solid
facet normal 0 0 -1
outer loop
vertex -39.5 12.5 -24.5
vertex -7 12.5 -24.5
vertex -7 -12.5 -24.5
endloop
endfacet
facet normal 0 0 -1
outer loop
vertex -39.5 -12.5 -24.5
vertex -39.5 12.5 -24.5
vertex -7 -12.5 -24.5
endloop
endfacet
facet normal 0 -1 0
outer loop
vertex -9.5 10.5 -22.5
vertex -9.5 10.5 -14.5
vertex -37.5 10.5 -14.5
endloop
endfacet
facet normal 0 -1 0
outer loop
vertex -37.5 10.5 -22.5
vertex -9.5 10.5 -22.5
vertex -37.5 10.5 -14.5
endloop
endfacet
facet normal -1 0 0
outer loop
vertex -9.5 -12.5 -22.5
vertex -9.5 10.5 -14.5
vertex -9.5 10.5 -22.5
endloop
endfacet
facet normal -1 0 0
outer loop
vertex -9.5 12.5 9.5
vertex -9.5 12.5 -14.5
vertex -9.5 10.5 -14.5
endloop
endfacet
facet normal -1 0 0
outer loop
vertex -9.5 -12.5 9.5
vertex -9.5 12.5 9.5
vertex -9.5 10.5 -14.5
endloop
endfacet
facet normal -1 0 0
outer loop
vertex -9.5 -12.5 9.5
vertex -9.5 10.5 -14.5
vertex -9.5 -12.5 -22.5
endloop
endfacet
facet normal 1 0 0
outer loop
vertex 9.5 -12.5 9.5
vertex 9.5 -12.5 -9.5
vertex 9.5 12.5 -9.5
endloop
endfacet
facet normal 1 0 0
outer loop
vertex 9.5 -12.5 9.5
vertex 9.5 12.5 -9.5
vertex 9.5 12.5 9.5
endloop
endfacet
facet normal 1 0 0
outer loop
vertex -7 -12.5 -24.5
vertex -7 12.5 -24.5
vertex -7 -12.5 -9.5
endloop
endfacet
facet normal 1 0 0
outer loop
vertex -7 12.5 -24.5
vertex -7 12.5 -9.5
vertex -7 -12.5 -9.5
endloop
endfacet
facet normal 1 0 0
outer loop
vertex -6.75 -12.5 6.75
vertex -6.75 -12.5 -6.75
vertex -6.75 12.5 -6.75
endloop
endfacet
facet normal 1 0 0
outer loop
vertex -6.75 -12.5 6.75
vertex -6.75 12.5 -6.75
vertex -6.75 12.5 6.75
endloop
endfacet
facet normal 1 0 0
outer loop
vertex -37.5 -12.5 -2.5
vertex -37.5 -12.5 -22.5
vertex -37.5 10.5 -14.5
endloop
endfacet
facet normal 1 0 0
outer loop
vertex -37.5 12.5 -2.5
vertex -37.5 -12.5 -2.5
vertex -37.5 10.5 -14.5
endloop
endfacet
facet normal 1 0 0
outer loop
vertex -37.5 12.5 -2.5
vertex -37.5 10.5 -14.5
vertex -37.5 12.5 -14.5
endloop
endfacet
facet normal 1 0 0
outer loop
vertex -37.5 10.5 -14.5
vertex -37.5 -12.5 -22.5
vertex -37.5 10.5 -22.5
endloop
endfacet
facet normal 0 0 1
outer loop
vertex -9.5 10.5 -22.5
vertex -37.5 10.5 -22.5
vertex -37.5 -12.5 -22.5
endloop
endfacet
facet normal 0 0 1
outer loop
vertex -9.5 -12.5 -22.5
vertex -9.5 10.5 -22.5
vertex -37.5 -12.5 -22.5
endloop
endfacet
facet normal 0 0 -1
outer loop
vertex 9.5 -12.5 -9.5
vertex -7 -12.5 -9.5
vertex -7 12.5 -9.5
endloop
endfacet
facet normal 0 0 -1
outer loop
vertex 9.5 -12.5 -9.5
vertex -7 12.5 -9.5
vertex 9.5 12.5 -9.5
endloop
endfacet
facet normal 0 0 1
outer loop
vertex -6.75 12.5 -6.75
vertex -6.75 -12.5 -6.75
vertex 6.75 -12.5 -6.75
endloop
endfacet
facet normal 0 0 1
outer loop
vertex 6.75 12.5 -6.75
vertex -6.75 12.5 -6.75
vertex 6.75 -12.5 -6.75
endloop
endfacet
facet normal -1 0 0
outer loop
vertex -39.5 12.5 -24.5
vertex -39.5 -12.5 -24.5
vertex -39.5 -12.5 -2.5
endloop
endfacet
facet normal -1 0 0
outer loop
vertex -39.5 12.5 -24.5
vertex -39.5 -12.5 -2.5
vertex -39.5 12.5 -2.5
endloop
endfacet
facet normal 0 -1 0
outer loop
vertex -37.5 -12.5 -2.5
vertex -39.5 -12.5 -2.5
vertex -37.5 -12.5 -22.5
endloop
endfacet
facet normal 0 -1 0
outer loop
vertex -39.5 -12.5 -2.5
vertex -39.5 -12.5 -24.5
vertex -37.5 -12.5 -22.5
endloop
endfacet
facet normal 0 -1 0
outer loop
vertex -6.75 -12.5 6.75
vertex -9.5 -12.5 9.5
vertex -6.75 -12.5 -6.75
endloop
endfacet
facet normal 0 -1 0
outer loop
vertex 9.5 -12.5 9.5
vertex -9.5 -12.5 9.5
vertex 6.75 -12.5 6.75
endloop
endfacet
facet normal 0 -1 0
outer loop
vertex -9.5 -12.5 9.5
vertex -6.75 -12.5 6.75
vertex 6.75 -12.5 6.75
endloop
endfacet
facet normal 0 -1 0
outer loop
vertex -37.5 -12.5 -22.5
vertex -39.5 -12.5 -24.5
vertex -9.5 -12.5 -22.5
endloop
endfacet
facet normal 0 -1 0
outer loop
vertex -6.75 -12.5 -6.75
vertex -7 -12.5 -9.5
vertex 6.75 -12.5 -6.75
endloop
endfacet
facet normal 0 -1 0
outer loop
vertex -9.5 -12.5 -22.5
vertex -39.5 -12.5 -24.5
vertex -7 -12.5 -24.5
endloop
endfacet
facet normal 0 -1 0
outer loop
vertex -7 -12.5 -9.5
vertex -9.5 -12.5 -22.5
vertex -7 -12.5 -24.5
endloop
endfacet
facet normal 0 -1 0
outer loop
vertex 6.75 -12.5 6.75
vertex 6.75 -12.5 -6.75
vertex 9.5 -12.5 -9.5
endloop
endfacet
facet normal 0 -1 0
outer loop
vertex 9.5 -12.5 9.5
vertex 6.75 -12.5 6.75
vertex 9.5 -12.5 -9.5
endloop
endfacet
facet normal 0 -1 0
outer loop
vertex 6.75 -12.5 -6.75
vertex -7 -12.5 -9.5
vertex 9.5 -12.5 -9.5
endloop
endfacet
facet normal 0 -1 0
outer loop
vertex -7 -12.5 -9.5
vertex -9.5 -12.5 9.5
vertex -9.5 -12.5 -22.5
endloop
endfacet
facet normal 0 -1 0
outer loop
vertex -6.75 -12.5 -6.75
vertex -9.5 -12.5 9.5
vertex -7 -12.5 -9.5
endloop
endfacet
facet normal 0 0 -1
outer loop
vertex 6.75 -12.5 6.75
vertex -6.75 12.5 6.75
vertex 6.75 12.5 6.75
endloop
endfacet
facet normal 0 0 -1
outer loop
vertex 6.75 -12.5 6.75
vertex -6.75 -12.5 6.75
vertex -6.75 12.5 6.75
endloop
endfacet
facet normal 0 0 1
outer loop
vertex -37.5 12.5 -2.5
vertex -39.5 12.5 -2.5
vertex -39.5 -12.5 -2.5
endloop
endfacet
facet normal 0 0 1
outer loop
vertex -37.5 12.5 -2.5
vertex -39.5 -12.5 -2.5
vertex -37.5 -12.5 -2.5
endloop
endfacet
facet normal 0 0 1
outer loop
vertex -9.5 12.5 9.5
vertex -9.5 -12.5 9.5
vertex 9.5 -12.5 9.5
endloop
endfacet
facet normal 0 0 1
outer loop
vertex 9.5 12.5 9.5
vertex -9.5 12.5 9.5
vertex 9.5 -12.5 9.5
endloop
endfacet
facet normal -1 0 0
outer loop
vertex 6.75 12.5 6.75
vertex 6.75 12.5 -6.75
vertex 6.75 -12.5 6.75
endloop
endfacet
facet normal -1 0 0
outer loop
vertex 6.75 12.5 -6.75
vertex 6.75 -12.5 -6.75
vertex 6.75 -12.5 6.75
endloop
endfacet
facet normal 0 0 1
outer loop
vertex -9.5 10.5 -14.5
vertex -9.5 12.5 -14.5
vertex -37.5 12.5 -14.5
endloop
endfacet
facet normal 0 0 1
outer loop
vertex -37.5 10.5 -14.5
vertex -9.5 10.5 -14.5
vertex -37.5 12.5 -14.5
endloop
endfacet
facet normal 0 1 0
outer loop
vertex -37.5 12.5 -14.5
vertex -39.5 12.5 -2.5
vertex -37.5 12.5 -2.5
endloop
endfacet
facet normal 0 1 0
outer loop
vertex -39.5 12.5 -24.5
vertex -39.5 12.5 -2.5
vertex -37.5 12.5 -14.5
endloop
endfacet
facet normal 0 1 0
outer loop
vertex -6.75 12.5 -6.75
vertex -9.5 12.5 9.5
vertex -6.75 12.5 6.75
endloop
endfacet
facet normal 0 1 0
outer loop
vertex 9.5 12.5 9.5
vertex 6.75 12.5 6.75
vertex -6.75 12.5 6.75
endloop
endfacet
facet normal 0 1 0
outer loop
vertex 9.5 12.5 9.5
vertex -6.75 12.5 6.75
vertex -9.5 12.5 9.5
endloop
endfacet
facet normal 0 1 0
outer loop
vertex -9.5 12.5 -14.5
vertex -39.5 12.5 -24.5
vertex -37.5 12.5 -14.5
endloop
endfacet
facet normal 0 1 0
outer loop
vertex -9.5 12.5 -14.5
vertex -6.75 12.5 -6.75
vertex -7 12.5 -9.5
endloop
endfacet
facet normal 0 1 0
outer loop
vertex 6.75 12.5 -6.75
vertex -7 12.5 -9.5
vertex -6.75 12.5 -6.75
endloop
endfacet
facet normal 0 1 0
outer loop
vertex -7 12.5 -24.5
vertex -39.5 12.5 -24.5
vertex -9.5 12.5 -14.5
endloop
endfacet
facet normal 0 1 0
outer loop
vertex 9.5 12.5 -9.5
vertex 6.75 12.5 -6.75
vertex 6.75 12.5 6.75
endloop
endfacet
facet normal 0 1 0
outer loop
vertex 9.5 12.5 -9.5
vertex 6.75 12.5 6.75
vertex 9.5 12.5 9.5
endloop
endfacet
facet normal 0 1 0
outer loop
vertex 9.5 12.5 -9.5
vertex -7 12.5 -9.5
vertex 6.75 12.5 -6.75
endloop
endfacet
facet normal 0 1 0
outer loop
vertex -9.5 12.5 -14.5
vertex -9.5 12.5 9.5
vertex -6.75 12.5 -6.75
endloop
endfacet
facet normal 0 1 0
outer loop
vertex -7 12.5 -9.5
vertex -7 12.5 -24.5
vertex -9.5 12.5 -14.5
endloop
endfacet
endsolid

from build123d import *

# Parameters (mm, degrees)
F0_W     = 19
F0_H     = 19
F0_W_2   = 13.5
F0_H_2   = 13.5
F1_DEPTH = 12.5
F2_W     = 25
F2_H     = 34
F3_DEPTH = 2.5
F4_W     = 25
F4_H     = 2
F5_DEPTH = 30
F6_W     = 2
F6_H     = 25
F7_DEPTH = 20
F8_W     = 32.5
F8_H     = 10
F9_DEPTH = 2


with BuildPart() as f1:
    # F0 (on Front) → F1 (new body, symmetric)
    with BuildSketch(Plane.XZ):
        Rectangle(F0_W, F0_H)
        Rectangle(F0_W_2, F0_H_2, mode=Mode.SUBTRACT)
    extrude(amount=F1_DEPTH, both=True)

    # F2 (on face) → F3 (join)
    with BuildSketch(Plane(origin=(-9.5, 0, 0), x_dir=(0, -1, 0), z_dir=(-1, 0, 0))):
        with Locations((0, -7.5)):
            Rectangle(F2_W, F2_H)
    extrude(amount=-F3_DEPTH)

    # F4 (on face) → F5 (join)
    with BuildSketch(Plane(origin=(-9.5, 0, 0), x_dir=(0, -1, 0), z_dir=(-1, 0, 0))):
        with Locations((0, -23.5)):
            Rectangle(F4_W, F4_H)
    extrude(amount=F5_DEPTH)

    # F6 (on face) → F7 (join)
    with BuildSketch(Plane.XY.offset(-22.5)):
        with Locations((-38.5, 0)):
            Rectangle(F6_W, F6_H)
    extrude(amount=F7_DEPTH)

    # F8 (on face) → F9 (join)
    with BuildSketch(Plane(origin=(0, 12.5, 0), x_dir=(-1, 0, 0), z_dir=(0, 1, 0))):
        with Locations((23.25, -19.5)):
            Rectangle(F8_W, F8_H)
    extrude(amount=-F9_DEPTH)


solid = f1.part
